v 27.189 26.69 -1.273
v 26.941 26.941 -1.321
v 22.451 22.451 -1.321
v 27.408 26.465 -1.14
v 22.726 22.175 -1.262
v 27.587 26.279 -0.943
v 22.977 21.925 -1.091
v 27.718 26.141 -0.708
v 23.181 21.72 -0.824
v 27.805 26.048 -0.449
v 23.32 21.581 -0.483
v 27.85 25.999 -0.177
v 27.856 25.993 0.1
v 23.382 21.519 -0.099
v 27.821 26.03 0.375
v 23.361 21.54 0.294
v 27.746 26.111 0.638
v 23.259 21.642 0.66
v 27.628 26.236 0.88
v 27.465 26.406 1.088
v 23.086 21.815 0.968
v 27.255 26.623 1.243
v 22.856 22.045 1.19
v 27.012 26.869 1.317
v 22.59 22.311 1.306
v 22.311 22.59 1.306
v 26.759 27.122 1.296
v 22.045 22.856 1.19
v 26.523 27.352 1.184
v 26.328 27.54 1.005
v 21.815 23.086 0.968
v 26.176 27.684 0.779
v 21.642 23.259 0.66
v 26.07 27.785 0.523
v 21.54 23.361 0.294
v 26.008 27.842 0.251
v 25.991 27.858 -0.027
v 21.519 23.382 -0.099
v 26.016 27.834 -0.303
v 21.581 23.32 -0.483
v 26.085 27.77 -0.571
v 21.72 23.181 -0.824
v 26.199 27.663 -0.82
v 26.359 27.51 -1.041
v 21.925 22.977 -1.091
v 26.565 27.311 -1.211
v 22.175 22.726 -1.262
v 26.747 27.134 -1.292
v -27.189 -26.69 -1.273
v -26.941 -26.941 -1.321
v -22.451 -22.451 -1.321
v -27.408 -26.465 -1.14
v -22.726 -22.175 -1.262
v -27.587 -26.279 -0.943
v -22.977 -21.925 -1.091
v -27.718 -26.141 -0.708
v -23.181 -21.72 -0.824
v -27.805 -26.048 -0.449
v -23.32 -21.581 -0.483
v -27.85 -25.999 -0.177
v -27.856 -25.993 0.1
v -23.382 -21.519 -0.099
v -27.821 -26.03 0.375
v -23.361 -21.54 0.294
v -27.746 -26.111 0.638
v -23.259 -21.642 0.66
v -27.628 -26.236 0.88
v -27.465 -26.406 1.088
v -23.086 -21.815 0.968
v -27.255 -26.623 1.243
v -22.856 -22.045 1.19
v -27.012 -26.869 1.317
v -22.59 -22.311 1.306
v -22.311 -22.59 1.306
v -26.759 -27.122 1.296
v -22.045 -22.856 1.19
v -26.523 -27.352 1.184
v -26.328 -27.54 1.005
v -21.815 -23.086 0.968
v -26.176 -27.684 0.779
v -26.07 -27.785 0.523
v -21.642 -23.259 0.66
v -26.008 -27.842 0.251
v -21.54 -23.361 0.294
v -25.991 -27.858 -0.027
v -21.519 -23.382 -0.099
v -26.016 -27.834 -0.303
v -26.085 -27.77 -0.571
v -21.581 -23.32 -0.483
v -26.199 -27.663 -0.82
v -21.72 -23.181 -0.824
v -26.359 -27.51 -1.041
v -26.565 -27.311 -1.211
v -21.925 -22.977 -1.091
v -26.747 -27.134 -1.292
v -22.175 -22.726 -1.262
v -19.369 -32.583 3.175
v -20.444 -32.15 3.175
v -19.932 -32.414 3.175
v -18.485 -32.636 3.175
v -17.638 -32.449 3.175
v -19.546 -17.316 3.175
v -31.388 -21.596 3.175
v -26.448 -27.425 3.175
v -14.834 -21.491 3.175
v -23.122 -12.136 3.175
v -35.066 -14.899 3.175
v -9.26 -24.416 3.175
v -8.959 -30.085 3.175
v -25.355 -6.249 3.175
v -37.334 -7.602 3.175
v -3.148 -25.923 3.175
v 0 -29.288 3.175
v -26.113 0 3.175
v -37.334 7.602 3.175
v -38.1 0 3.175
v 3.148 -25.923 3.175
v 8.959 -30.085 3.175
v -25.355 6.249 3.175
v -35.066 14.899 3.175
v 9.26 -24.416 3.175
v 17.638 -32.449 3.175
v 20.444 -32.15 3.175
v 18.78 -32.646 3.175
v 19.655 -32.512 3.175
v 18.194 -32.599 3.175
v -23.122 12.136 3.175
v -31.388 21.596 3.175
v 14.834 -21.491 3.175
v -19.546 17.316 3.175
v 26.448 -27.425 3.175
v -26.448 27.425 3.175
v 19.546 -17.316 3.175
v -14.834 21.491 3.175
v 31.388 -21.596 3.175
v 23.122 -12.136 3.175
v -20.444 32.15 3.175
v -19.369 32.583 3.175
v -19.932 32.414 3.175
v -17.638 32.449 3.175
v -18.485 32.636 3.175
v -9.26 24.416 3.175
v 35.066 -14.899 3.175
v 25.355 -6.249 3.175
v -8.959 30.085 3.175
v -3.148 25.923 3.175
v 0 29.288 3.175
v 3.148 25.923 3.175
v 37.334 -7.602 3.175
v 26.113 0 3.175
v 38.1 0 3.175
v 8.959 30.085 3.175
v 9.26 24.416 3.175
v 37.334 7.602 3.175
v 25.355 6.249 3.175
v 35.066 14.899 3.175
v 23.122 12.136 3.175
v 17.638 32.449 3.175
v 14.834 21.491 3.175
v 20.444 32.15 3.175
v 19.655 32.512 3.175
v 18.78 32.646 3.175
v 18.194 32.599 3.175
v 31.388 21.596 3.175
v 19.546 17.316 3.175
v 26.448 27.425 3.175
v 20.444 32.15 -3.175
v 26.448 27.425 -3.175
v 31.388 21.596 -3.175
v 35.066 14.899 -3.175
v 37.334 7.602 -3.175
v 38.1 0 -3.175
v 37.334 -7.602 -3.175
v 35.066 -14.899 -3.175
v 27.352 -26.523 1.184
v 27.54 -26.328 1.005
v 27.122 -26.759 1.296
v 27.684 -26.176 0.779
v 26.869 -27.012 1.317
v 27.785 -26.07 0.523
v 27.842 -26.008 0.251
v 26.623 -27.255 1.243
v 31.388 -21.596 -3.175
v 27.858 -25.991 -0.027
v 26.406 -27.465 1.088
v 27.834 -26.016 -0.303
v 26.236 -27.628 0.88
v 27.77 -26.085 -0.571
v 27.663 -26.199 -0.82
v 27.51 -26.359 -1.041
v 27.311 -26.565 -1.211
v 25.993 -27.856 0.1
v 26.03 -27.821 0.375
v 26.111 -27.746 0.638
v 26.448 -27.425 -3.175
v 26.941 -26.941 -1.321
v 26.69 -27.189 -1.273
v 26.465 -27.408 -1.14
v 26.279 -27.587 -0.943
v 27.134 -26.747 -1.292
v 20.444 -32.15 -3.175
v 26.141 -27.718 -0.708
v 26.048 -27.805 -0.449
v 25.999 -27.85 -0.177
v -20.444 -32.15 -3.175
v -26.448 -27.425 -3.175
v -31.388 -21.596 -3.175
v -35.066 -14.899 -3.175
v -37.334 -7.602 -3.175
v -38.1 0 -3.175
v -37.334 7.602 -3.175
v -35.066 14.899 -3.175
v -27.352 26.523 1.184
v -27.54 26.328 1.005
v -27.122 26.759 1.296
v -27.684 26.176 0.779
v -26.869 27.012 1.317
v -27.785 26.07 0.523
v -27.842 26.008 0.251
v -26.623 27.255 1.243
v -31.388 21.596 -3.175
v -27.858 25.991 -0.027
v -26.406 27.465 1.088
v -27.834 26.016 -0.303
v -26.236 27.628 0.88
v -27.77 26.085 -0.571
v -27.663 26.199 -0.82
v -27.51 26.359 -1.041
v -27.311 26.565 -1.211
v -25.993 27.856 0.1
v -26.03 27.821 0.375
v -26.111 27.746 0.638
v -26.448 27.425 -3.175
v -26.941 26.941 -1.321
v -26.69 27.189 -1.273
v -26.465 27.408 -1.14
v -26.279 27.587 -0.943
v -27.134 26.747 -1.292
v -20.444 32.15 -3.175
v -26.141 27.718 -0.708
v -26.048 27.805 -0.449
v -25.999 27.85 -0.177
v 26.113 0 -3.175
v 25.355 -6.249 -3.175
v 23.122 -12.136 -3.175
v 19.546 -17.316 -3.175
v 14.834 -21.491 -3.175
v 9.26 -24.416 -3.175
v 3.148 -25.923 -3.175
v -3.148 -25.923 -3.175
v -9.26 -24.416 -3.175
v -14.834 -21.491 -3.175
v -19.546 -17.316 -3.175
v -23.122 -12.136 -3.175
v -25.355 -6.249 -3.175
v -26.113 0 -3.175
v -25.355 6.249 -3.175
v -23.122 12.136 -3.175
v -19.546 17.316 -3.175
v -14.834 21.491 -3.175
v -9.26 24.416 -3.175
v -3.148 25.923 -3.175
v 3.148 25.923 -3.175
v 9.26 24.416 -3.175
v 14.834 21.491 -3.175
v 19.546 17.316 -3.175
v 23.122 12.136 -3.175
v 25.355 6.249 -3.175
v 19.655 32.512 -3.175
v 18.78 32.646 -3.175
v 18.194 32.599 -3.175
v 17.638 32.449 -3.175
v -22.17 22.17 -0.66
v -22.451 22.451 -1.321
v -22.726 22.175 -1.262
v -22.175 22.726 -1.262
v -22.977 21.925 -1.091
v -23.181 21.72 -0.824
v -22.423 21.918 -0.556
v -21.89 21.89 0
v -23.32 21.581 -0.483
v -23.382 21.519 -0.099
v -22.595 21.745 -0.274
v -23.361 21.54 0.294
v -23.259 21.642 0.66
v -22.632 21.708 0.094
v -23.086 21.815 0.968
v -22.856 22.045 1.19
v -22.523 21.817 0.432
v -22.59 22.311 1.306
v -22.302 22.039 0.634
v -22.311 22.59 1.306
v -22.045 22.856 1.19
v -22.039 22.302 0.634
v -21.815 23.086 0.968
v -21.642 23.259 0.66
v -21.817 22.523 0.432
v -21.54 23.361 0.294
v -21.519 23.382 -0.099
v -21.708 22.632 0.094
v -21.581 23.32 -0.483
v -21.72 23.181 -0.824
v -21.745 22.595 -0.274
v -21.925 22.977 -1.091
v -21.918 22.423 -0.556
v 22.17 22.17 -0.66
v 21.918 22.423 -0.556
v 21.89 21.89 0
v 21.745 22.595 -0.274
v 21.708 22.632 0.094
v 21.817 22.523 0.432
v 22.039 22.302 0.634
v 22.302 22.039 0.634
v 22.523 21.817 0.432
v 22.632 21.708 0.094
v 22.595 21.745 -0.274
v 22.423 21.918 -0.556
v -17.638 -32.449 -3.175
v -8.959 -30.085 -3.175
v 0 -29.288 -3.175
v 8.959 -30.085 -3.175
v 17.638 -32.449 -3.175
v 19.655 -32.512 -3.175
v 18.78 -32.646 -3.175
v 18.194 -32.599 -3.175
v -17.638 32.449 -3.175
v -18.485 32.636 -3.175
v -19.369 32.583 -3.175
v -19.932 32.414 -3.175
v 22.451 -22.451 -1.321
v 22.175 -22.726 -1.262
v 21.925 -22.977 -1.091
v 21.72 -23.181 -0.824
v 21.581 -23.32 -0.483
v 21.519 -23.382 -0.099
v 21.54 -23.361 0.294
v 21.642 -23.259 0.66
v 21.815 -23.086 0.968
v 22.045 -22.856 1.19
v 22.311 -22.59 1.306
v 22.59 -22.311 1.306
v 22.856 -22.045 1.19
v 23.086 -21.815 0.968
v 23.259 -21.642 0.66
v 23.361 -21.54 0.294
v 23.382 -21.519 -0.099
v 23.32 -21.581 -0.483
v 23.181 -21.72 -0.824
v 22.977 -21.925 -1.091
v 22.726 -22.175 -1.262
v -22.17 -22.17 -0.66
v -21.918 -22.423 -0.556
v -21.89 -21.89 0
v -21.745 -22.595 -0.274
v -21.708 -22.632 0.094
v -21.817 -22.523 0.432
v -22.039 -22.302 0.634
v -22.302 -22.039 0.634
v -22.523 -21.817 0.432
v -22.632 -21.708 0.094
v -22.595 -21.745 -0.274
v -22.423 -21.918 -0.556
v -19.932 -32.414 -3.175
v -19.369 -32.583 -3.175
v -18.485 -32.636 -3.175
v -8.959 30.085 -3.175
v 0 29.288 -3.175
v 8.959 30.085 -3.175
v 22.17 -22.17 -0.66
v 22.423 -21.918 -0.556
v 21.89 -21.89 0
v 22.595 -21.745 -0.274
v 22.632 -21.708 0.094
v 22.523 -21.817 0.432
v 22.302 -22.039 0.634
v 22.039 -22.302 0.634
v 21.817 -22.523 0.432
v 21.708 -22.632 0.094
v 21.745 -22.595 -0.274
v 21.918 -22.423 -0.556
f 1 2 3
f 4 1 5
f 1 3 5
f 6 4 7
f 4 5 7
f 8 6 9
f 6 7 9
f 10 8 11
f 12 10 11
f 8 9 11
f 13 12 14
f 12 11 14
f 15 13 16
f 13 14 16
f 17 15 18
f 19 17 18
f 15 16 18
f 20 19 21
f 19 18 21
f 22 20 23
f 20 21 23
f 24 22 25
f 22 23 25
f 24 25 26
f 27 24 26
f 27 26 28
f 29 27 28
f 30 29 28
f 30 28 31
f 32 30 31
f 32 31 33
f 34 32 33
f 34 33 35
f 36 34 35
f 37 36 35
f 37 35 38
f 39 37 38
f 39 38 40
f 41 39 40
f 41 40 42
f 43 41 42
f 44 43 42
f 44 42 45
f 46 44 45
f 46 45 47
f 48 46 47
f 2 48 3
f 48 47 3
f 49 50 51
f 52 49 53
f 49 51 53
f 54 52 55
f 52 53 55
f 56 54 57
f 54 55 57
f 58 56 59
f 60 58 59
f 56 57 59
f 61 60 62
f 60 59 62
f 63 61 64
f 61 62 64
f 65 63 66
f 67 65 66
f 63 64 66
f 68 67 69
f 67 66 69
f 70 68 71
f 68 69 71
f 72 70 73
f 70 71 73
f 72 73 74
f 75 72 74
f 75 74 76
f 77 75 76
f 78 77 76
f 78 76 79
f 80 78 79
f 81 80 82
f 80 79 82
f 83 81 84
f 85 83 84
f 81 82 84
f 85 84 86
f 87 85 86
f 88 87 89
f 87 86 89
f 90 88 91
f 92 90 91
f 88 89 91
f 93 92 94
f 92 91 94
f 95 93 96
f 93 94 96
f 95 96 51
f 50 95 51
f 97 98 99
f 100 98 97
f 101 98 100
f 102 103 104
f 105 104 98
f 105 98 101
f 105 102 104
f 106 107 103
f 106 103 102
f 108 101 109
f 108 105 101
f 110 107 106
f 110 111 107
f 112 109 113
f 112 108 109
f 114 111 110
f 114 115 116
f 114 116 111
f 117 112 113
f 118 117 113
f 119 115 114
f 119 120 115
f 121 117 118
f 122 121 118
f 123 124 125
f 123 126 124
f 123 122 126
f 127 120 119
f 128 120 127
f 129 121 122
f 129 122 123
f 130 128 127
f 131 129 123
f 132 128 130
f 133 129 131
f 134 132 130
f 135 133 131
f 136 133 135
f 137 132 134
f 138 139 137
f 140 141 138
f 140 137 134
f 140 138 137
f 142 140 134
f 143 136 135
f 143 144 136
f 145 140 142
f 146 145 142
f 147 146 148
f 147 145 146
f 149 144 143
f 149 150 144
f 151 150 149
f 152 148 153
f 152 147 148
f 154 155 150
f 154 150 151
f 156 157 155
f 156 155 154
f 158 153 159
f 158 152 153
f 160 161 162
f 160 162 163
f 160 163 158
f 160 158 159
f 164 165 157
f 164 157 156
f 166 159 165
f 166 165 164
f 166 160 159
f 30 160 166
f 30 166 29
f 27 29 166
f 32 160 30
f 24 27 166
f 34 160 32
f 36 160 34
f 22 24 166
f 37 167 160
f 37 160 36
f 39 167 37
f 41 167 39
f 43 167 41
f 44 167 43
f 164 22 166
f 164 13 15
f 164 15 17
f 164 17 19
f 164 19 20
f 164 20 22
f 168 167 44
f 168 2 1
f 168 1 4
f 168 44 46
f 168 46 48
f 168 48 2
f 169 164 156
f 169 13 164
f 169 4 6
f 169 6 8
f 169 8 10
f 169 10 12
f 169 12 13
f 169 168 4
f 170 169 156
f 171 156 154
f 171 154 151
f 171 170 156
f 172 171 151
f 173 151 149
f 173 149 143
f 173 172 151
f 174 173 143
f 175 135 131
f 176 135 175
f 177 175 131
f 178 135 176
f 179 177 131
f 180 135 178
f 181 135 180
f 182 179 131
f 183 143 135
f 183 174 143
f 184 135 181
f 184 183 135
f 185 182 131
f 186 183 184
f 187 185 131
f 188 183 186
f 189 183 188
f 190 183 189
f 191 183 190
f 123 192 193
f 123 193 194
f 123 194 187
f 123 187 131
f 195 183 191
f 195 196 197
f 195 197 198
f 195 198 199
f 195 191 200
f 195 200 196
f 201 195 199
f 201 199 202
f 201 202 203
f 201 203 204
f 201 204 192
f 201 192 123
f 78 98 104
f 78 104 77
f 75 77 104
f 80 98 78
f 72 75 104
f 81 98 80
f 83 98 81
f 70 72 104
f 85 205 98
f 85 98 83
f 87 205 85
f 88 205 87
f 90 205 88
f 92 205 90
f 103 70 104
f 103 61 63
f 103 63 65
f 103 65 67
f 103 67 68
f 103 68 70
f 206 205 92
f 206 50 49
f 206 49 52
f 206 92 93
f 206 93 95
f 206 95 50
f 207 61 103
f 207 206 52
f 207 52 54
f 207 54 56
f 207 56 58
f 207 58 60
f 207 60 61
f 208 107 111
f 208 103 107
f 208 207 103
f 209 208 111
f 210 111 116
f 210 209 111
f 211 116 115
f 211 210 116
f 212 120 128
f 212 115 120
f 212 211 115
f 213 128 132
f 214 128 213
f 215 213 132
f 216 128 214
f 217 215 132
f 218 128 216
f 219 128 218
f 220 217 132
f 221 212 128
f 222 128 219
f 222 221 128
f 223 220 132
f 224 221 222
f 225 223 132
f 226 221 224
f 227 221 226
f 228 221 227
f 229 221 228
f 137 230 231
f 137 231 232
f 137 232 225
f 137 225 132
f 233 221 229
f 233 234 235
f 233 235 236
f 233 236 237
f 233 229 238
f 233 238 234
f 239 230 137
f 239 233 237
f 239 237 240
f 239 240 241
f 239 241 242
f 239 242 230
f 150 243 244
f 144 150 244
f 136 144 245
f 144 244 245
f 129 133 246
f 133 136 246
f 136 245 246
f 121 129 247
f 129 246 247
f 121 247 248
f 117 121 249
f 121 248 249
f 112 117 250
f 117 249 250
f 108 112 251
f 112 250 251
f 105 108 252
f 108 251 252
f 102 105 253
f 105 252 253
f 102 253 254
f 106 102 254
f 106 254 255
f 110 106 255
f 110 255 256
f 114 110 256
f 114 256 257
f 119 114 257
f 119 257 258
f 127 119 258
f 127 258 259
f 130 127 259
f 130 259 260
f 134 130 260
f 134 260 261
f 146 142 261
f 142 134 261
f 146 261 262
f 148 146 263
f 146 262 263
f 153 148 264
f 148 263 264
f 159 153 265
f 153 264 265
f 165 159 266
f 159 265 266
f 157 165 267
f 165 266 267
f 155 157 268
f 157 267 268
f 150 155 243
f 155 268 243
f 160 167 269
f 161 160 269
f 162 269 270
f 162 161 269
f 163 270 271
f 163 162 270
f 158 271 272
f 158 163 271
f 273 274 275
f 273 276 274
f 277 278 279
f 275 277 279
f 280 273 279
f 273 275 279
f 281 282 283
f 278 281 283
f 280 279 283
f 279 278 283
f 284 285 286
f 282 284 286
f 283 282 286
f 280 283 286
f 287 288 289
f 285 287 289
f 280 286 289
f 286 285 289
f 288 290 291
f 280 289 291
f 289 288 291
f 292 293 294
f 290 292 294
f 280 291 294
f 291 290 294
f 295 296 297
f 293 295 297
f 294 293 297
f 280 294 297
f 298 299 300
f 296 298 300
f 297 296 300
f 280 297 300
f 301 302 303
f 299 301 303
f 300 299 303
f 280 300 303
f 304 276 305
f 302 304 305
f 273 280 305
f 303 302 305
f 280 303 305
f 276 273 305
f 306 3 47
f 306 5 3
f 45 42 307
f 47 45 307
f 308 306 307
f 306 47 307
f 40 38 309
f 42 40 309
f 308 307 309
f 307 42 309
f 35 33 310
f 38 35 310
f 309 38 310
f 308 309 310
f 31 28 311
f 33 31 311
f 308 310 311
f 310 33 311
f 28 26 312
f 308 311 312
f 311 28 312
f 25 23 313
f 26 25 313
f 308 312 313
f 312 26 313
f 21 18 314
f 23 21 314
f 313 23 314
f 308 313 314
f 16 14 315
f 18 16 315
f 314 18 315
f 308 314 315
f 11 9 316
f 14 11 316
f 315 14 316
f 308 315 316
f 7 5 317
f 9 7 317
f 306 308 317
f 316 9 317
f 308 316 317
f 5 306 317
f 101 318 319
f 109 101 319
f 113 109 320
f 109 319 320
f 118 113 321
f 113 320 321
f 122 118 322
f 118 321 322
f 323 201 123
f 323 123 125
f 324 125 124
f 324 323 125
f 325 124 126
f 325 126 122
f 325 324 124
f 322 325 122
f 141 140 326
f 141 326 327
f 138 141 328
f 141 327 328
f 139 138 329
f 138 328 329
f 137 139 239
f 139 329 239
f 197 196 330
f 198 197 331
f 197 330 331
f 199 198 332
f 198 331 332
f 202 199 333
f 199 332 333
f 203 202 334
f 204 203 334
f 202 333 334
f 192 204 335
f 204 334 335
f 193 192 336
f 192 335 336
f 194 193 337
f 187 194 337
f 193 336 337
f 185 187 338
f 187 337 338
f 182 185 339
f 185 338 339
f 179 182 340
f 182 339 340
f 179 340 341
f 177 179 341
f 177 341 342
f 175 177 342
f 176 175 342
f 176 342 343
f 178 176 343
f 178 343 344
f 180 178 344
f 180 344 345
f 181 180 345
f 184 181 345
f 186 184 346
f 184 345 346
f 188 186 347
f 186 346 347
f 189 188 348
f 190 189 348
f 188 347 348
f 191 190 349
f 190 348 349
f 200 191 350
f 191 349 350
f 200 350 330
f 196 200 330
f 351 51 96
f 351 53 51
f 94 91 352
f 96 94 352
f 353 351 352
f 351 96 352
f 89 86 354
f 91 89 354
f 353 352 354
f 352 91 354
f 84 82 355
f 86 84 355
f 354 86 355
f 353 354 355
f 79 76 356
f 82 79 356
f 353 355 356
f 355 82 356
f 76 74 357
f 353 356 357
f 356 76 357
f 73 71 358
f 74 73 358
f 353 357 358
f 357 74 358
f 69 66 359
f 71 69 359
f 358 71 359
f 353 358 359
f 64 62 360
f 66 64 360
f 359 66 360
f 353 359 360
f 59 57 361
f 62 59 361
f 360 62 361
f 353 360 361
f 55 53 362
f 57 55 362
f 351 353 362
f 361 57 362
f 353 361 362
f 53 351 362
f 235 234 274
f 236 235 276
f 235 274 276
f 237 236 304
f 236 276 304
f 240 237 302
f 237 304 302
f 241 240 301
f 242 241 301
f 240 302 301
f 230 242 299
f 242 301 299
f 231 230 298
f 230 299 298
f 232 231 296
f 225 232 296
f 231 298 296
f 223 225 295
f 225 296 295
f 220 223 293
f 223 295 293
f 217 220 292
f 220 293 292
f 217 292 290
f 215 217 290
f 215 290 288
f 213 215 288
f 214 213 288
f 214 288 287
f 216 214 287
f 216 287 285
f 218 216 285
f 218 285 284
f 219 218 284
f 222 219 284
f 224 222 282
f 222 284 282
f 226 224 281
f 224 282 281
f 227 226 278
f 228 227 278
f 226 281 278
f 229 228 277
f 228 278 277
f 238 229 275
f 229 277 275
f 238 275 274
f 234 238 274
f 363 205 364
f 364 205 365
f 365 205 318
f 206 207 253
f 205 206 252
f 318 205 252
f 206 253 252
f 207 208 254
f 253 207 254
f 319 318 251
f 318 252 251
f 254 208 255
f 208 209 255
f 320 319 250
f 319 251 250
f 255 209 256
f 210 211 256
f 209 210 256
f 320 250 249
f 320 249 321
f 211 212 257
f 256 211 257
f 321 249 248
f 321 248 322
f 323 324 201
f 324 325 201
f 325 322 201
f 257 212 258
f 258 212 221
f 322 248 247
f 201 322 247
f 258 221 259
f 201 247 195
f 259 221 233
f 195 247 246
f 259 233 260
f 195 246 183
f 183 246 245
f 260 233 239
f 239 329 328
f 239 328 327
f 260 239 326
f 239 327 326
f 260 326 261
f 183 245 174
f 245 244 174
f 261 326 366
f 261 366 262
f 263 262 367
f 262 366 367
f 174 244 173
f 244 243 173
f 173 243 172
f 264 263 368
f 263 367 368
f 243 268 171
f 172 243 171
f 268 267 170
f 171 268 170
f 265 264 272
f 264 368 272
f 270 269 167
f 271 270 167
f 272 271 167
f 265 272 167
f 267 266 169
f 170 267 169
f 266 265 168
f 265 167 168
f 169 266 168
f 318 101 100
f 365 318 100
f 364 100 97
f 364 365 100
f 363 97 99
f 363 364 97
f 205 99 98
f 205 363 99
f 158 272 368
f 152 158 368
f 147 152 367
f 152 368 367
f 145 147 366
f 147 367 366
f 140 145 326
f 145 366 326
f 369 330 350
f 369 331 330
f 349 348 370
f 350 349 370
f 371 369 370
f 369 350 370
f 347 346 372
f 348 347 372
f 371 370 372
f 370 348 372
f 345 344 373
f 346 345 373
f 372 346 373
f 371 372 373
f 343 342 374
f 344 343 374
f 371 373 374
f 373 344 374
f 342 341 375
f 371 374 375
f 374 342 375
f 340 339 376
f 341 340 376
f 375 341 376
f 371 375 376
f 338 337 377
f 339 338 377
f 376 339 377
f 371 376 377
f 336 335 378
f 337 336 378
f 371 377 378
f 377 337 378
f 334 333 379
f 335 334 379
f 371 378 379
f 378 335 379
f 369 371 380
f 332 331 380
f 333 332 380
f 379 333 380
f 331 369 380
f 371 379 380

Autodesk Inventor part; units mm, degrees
ref_plane "XY Plane" through (0, 0, 0) normal (0, 0, 1) x (1, 0, 0)
sketch "Sketch1" plane through (0, 0, 0) normal (0, 0, 1) x (1, 0, 0)
  circle A0 centre (0, 0) radius 38.1
  arc A1 (-19.05, 32.9956) -> (19.05, 32.9956) centre (0, 80.0884) ccw
  line L0 (-38.1, 0) -> (38.1, 0) construction
  arc A2 (19.05, -32.9956) -> (-19.05, -32.9956) centre (0, -80.0884) ccw
  circle A3 centre (0, 0) radius 26.1134
  line L1 (0, 29.2884) -> (0, 26.1134) construction
  point P0 (-19.05, -32.9956)
  point P1 (19.05, -32.9956)
  dimension "d0" = 76.2
  dimension "d1" = 38.1
  dimension "d3" = 50.8
  dimension "d4" = 3.175
extrude "Extrusion1" add sketch "Sketch1" along normal mid plane 6.35 contours A0 A2 A1
ref_plane "Work Plane4" through (26.9408, -26.9408, 0) normal (-0.7071, 0.7071, 0) x (0, 0, 1)
ref_plane "Work Plane3" through (38.1, 38.1, 0) normal (-0.7071, 0.7071, 0) x (0, 0, 1)
sketch "Sketch2" plane through (26.9408, -26.9408, 0) normal (-0.7071, 0.7071, 0) x (0, 0, 1)
  point P0 (0, 0)
  point P1 (0, 0)
hole "Hole1" at (26.9408, -26.9408, 0) direction (-0.7071, 0.7071, 0) diameter 2.6416 depth 6.35 tip angle 118 thread size "6-32 UNC" class "2B" standard "ANSI Unified Screw Threads"
pattern_circular "Circular Pattern1" count 4 over 360 about axis through (0, 0, 0) along (0, 0, 1) of "Hole1"
fillet "Fillet1" radius 3.175 4 edges at (-19.05, -32.9956, 0) (19.05, -32.9956, 0) (19.05, 32.9956, 0) (-19.05, 32.9956, 0)
ref_plane "Work Plane1" through (0, 38.1, 0) normal (0, 1, 0) x (-1, 0, 0)
ref_plane "Work Plane2" through (38.1, 0, 0) normal (1, 0, 0) x (0, 1, 0)
properties part number "ShockCordSupportBulkhead"
